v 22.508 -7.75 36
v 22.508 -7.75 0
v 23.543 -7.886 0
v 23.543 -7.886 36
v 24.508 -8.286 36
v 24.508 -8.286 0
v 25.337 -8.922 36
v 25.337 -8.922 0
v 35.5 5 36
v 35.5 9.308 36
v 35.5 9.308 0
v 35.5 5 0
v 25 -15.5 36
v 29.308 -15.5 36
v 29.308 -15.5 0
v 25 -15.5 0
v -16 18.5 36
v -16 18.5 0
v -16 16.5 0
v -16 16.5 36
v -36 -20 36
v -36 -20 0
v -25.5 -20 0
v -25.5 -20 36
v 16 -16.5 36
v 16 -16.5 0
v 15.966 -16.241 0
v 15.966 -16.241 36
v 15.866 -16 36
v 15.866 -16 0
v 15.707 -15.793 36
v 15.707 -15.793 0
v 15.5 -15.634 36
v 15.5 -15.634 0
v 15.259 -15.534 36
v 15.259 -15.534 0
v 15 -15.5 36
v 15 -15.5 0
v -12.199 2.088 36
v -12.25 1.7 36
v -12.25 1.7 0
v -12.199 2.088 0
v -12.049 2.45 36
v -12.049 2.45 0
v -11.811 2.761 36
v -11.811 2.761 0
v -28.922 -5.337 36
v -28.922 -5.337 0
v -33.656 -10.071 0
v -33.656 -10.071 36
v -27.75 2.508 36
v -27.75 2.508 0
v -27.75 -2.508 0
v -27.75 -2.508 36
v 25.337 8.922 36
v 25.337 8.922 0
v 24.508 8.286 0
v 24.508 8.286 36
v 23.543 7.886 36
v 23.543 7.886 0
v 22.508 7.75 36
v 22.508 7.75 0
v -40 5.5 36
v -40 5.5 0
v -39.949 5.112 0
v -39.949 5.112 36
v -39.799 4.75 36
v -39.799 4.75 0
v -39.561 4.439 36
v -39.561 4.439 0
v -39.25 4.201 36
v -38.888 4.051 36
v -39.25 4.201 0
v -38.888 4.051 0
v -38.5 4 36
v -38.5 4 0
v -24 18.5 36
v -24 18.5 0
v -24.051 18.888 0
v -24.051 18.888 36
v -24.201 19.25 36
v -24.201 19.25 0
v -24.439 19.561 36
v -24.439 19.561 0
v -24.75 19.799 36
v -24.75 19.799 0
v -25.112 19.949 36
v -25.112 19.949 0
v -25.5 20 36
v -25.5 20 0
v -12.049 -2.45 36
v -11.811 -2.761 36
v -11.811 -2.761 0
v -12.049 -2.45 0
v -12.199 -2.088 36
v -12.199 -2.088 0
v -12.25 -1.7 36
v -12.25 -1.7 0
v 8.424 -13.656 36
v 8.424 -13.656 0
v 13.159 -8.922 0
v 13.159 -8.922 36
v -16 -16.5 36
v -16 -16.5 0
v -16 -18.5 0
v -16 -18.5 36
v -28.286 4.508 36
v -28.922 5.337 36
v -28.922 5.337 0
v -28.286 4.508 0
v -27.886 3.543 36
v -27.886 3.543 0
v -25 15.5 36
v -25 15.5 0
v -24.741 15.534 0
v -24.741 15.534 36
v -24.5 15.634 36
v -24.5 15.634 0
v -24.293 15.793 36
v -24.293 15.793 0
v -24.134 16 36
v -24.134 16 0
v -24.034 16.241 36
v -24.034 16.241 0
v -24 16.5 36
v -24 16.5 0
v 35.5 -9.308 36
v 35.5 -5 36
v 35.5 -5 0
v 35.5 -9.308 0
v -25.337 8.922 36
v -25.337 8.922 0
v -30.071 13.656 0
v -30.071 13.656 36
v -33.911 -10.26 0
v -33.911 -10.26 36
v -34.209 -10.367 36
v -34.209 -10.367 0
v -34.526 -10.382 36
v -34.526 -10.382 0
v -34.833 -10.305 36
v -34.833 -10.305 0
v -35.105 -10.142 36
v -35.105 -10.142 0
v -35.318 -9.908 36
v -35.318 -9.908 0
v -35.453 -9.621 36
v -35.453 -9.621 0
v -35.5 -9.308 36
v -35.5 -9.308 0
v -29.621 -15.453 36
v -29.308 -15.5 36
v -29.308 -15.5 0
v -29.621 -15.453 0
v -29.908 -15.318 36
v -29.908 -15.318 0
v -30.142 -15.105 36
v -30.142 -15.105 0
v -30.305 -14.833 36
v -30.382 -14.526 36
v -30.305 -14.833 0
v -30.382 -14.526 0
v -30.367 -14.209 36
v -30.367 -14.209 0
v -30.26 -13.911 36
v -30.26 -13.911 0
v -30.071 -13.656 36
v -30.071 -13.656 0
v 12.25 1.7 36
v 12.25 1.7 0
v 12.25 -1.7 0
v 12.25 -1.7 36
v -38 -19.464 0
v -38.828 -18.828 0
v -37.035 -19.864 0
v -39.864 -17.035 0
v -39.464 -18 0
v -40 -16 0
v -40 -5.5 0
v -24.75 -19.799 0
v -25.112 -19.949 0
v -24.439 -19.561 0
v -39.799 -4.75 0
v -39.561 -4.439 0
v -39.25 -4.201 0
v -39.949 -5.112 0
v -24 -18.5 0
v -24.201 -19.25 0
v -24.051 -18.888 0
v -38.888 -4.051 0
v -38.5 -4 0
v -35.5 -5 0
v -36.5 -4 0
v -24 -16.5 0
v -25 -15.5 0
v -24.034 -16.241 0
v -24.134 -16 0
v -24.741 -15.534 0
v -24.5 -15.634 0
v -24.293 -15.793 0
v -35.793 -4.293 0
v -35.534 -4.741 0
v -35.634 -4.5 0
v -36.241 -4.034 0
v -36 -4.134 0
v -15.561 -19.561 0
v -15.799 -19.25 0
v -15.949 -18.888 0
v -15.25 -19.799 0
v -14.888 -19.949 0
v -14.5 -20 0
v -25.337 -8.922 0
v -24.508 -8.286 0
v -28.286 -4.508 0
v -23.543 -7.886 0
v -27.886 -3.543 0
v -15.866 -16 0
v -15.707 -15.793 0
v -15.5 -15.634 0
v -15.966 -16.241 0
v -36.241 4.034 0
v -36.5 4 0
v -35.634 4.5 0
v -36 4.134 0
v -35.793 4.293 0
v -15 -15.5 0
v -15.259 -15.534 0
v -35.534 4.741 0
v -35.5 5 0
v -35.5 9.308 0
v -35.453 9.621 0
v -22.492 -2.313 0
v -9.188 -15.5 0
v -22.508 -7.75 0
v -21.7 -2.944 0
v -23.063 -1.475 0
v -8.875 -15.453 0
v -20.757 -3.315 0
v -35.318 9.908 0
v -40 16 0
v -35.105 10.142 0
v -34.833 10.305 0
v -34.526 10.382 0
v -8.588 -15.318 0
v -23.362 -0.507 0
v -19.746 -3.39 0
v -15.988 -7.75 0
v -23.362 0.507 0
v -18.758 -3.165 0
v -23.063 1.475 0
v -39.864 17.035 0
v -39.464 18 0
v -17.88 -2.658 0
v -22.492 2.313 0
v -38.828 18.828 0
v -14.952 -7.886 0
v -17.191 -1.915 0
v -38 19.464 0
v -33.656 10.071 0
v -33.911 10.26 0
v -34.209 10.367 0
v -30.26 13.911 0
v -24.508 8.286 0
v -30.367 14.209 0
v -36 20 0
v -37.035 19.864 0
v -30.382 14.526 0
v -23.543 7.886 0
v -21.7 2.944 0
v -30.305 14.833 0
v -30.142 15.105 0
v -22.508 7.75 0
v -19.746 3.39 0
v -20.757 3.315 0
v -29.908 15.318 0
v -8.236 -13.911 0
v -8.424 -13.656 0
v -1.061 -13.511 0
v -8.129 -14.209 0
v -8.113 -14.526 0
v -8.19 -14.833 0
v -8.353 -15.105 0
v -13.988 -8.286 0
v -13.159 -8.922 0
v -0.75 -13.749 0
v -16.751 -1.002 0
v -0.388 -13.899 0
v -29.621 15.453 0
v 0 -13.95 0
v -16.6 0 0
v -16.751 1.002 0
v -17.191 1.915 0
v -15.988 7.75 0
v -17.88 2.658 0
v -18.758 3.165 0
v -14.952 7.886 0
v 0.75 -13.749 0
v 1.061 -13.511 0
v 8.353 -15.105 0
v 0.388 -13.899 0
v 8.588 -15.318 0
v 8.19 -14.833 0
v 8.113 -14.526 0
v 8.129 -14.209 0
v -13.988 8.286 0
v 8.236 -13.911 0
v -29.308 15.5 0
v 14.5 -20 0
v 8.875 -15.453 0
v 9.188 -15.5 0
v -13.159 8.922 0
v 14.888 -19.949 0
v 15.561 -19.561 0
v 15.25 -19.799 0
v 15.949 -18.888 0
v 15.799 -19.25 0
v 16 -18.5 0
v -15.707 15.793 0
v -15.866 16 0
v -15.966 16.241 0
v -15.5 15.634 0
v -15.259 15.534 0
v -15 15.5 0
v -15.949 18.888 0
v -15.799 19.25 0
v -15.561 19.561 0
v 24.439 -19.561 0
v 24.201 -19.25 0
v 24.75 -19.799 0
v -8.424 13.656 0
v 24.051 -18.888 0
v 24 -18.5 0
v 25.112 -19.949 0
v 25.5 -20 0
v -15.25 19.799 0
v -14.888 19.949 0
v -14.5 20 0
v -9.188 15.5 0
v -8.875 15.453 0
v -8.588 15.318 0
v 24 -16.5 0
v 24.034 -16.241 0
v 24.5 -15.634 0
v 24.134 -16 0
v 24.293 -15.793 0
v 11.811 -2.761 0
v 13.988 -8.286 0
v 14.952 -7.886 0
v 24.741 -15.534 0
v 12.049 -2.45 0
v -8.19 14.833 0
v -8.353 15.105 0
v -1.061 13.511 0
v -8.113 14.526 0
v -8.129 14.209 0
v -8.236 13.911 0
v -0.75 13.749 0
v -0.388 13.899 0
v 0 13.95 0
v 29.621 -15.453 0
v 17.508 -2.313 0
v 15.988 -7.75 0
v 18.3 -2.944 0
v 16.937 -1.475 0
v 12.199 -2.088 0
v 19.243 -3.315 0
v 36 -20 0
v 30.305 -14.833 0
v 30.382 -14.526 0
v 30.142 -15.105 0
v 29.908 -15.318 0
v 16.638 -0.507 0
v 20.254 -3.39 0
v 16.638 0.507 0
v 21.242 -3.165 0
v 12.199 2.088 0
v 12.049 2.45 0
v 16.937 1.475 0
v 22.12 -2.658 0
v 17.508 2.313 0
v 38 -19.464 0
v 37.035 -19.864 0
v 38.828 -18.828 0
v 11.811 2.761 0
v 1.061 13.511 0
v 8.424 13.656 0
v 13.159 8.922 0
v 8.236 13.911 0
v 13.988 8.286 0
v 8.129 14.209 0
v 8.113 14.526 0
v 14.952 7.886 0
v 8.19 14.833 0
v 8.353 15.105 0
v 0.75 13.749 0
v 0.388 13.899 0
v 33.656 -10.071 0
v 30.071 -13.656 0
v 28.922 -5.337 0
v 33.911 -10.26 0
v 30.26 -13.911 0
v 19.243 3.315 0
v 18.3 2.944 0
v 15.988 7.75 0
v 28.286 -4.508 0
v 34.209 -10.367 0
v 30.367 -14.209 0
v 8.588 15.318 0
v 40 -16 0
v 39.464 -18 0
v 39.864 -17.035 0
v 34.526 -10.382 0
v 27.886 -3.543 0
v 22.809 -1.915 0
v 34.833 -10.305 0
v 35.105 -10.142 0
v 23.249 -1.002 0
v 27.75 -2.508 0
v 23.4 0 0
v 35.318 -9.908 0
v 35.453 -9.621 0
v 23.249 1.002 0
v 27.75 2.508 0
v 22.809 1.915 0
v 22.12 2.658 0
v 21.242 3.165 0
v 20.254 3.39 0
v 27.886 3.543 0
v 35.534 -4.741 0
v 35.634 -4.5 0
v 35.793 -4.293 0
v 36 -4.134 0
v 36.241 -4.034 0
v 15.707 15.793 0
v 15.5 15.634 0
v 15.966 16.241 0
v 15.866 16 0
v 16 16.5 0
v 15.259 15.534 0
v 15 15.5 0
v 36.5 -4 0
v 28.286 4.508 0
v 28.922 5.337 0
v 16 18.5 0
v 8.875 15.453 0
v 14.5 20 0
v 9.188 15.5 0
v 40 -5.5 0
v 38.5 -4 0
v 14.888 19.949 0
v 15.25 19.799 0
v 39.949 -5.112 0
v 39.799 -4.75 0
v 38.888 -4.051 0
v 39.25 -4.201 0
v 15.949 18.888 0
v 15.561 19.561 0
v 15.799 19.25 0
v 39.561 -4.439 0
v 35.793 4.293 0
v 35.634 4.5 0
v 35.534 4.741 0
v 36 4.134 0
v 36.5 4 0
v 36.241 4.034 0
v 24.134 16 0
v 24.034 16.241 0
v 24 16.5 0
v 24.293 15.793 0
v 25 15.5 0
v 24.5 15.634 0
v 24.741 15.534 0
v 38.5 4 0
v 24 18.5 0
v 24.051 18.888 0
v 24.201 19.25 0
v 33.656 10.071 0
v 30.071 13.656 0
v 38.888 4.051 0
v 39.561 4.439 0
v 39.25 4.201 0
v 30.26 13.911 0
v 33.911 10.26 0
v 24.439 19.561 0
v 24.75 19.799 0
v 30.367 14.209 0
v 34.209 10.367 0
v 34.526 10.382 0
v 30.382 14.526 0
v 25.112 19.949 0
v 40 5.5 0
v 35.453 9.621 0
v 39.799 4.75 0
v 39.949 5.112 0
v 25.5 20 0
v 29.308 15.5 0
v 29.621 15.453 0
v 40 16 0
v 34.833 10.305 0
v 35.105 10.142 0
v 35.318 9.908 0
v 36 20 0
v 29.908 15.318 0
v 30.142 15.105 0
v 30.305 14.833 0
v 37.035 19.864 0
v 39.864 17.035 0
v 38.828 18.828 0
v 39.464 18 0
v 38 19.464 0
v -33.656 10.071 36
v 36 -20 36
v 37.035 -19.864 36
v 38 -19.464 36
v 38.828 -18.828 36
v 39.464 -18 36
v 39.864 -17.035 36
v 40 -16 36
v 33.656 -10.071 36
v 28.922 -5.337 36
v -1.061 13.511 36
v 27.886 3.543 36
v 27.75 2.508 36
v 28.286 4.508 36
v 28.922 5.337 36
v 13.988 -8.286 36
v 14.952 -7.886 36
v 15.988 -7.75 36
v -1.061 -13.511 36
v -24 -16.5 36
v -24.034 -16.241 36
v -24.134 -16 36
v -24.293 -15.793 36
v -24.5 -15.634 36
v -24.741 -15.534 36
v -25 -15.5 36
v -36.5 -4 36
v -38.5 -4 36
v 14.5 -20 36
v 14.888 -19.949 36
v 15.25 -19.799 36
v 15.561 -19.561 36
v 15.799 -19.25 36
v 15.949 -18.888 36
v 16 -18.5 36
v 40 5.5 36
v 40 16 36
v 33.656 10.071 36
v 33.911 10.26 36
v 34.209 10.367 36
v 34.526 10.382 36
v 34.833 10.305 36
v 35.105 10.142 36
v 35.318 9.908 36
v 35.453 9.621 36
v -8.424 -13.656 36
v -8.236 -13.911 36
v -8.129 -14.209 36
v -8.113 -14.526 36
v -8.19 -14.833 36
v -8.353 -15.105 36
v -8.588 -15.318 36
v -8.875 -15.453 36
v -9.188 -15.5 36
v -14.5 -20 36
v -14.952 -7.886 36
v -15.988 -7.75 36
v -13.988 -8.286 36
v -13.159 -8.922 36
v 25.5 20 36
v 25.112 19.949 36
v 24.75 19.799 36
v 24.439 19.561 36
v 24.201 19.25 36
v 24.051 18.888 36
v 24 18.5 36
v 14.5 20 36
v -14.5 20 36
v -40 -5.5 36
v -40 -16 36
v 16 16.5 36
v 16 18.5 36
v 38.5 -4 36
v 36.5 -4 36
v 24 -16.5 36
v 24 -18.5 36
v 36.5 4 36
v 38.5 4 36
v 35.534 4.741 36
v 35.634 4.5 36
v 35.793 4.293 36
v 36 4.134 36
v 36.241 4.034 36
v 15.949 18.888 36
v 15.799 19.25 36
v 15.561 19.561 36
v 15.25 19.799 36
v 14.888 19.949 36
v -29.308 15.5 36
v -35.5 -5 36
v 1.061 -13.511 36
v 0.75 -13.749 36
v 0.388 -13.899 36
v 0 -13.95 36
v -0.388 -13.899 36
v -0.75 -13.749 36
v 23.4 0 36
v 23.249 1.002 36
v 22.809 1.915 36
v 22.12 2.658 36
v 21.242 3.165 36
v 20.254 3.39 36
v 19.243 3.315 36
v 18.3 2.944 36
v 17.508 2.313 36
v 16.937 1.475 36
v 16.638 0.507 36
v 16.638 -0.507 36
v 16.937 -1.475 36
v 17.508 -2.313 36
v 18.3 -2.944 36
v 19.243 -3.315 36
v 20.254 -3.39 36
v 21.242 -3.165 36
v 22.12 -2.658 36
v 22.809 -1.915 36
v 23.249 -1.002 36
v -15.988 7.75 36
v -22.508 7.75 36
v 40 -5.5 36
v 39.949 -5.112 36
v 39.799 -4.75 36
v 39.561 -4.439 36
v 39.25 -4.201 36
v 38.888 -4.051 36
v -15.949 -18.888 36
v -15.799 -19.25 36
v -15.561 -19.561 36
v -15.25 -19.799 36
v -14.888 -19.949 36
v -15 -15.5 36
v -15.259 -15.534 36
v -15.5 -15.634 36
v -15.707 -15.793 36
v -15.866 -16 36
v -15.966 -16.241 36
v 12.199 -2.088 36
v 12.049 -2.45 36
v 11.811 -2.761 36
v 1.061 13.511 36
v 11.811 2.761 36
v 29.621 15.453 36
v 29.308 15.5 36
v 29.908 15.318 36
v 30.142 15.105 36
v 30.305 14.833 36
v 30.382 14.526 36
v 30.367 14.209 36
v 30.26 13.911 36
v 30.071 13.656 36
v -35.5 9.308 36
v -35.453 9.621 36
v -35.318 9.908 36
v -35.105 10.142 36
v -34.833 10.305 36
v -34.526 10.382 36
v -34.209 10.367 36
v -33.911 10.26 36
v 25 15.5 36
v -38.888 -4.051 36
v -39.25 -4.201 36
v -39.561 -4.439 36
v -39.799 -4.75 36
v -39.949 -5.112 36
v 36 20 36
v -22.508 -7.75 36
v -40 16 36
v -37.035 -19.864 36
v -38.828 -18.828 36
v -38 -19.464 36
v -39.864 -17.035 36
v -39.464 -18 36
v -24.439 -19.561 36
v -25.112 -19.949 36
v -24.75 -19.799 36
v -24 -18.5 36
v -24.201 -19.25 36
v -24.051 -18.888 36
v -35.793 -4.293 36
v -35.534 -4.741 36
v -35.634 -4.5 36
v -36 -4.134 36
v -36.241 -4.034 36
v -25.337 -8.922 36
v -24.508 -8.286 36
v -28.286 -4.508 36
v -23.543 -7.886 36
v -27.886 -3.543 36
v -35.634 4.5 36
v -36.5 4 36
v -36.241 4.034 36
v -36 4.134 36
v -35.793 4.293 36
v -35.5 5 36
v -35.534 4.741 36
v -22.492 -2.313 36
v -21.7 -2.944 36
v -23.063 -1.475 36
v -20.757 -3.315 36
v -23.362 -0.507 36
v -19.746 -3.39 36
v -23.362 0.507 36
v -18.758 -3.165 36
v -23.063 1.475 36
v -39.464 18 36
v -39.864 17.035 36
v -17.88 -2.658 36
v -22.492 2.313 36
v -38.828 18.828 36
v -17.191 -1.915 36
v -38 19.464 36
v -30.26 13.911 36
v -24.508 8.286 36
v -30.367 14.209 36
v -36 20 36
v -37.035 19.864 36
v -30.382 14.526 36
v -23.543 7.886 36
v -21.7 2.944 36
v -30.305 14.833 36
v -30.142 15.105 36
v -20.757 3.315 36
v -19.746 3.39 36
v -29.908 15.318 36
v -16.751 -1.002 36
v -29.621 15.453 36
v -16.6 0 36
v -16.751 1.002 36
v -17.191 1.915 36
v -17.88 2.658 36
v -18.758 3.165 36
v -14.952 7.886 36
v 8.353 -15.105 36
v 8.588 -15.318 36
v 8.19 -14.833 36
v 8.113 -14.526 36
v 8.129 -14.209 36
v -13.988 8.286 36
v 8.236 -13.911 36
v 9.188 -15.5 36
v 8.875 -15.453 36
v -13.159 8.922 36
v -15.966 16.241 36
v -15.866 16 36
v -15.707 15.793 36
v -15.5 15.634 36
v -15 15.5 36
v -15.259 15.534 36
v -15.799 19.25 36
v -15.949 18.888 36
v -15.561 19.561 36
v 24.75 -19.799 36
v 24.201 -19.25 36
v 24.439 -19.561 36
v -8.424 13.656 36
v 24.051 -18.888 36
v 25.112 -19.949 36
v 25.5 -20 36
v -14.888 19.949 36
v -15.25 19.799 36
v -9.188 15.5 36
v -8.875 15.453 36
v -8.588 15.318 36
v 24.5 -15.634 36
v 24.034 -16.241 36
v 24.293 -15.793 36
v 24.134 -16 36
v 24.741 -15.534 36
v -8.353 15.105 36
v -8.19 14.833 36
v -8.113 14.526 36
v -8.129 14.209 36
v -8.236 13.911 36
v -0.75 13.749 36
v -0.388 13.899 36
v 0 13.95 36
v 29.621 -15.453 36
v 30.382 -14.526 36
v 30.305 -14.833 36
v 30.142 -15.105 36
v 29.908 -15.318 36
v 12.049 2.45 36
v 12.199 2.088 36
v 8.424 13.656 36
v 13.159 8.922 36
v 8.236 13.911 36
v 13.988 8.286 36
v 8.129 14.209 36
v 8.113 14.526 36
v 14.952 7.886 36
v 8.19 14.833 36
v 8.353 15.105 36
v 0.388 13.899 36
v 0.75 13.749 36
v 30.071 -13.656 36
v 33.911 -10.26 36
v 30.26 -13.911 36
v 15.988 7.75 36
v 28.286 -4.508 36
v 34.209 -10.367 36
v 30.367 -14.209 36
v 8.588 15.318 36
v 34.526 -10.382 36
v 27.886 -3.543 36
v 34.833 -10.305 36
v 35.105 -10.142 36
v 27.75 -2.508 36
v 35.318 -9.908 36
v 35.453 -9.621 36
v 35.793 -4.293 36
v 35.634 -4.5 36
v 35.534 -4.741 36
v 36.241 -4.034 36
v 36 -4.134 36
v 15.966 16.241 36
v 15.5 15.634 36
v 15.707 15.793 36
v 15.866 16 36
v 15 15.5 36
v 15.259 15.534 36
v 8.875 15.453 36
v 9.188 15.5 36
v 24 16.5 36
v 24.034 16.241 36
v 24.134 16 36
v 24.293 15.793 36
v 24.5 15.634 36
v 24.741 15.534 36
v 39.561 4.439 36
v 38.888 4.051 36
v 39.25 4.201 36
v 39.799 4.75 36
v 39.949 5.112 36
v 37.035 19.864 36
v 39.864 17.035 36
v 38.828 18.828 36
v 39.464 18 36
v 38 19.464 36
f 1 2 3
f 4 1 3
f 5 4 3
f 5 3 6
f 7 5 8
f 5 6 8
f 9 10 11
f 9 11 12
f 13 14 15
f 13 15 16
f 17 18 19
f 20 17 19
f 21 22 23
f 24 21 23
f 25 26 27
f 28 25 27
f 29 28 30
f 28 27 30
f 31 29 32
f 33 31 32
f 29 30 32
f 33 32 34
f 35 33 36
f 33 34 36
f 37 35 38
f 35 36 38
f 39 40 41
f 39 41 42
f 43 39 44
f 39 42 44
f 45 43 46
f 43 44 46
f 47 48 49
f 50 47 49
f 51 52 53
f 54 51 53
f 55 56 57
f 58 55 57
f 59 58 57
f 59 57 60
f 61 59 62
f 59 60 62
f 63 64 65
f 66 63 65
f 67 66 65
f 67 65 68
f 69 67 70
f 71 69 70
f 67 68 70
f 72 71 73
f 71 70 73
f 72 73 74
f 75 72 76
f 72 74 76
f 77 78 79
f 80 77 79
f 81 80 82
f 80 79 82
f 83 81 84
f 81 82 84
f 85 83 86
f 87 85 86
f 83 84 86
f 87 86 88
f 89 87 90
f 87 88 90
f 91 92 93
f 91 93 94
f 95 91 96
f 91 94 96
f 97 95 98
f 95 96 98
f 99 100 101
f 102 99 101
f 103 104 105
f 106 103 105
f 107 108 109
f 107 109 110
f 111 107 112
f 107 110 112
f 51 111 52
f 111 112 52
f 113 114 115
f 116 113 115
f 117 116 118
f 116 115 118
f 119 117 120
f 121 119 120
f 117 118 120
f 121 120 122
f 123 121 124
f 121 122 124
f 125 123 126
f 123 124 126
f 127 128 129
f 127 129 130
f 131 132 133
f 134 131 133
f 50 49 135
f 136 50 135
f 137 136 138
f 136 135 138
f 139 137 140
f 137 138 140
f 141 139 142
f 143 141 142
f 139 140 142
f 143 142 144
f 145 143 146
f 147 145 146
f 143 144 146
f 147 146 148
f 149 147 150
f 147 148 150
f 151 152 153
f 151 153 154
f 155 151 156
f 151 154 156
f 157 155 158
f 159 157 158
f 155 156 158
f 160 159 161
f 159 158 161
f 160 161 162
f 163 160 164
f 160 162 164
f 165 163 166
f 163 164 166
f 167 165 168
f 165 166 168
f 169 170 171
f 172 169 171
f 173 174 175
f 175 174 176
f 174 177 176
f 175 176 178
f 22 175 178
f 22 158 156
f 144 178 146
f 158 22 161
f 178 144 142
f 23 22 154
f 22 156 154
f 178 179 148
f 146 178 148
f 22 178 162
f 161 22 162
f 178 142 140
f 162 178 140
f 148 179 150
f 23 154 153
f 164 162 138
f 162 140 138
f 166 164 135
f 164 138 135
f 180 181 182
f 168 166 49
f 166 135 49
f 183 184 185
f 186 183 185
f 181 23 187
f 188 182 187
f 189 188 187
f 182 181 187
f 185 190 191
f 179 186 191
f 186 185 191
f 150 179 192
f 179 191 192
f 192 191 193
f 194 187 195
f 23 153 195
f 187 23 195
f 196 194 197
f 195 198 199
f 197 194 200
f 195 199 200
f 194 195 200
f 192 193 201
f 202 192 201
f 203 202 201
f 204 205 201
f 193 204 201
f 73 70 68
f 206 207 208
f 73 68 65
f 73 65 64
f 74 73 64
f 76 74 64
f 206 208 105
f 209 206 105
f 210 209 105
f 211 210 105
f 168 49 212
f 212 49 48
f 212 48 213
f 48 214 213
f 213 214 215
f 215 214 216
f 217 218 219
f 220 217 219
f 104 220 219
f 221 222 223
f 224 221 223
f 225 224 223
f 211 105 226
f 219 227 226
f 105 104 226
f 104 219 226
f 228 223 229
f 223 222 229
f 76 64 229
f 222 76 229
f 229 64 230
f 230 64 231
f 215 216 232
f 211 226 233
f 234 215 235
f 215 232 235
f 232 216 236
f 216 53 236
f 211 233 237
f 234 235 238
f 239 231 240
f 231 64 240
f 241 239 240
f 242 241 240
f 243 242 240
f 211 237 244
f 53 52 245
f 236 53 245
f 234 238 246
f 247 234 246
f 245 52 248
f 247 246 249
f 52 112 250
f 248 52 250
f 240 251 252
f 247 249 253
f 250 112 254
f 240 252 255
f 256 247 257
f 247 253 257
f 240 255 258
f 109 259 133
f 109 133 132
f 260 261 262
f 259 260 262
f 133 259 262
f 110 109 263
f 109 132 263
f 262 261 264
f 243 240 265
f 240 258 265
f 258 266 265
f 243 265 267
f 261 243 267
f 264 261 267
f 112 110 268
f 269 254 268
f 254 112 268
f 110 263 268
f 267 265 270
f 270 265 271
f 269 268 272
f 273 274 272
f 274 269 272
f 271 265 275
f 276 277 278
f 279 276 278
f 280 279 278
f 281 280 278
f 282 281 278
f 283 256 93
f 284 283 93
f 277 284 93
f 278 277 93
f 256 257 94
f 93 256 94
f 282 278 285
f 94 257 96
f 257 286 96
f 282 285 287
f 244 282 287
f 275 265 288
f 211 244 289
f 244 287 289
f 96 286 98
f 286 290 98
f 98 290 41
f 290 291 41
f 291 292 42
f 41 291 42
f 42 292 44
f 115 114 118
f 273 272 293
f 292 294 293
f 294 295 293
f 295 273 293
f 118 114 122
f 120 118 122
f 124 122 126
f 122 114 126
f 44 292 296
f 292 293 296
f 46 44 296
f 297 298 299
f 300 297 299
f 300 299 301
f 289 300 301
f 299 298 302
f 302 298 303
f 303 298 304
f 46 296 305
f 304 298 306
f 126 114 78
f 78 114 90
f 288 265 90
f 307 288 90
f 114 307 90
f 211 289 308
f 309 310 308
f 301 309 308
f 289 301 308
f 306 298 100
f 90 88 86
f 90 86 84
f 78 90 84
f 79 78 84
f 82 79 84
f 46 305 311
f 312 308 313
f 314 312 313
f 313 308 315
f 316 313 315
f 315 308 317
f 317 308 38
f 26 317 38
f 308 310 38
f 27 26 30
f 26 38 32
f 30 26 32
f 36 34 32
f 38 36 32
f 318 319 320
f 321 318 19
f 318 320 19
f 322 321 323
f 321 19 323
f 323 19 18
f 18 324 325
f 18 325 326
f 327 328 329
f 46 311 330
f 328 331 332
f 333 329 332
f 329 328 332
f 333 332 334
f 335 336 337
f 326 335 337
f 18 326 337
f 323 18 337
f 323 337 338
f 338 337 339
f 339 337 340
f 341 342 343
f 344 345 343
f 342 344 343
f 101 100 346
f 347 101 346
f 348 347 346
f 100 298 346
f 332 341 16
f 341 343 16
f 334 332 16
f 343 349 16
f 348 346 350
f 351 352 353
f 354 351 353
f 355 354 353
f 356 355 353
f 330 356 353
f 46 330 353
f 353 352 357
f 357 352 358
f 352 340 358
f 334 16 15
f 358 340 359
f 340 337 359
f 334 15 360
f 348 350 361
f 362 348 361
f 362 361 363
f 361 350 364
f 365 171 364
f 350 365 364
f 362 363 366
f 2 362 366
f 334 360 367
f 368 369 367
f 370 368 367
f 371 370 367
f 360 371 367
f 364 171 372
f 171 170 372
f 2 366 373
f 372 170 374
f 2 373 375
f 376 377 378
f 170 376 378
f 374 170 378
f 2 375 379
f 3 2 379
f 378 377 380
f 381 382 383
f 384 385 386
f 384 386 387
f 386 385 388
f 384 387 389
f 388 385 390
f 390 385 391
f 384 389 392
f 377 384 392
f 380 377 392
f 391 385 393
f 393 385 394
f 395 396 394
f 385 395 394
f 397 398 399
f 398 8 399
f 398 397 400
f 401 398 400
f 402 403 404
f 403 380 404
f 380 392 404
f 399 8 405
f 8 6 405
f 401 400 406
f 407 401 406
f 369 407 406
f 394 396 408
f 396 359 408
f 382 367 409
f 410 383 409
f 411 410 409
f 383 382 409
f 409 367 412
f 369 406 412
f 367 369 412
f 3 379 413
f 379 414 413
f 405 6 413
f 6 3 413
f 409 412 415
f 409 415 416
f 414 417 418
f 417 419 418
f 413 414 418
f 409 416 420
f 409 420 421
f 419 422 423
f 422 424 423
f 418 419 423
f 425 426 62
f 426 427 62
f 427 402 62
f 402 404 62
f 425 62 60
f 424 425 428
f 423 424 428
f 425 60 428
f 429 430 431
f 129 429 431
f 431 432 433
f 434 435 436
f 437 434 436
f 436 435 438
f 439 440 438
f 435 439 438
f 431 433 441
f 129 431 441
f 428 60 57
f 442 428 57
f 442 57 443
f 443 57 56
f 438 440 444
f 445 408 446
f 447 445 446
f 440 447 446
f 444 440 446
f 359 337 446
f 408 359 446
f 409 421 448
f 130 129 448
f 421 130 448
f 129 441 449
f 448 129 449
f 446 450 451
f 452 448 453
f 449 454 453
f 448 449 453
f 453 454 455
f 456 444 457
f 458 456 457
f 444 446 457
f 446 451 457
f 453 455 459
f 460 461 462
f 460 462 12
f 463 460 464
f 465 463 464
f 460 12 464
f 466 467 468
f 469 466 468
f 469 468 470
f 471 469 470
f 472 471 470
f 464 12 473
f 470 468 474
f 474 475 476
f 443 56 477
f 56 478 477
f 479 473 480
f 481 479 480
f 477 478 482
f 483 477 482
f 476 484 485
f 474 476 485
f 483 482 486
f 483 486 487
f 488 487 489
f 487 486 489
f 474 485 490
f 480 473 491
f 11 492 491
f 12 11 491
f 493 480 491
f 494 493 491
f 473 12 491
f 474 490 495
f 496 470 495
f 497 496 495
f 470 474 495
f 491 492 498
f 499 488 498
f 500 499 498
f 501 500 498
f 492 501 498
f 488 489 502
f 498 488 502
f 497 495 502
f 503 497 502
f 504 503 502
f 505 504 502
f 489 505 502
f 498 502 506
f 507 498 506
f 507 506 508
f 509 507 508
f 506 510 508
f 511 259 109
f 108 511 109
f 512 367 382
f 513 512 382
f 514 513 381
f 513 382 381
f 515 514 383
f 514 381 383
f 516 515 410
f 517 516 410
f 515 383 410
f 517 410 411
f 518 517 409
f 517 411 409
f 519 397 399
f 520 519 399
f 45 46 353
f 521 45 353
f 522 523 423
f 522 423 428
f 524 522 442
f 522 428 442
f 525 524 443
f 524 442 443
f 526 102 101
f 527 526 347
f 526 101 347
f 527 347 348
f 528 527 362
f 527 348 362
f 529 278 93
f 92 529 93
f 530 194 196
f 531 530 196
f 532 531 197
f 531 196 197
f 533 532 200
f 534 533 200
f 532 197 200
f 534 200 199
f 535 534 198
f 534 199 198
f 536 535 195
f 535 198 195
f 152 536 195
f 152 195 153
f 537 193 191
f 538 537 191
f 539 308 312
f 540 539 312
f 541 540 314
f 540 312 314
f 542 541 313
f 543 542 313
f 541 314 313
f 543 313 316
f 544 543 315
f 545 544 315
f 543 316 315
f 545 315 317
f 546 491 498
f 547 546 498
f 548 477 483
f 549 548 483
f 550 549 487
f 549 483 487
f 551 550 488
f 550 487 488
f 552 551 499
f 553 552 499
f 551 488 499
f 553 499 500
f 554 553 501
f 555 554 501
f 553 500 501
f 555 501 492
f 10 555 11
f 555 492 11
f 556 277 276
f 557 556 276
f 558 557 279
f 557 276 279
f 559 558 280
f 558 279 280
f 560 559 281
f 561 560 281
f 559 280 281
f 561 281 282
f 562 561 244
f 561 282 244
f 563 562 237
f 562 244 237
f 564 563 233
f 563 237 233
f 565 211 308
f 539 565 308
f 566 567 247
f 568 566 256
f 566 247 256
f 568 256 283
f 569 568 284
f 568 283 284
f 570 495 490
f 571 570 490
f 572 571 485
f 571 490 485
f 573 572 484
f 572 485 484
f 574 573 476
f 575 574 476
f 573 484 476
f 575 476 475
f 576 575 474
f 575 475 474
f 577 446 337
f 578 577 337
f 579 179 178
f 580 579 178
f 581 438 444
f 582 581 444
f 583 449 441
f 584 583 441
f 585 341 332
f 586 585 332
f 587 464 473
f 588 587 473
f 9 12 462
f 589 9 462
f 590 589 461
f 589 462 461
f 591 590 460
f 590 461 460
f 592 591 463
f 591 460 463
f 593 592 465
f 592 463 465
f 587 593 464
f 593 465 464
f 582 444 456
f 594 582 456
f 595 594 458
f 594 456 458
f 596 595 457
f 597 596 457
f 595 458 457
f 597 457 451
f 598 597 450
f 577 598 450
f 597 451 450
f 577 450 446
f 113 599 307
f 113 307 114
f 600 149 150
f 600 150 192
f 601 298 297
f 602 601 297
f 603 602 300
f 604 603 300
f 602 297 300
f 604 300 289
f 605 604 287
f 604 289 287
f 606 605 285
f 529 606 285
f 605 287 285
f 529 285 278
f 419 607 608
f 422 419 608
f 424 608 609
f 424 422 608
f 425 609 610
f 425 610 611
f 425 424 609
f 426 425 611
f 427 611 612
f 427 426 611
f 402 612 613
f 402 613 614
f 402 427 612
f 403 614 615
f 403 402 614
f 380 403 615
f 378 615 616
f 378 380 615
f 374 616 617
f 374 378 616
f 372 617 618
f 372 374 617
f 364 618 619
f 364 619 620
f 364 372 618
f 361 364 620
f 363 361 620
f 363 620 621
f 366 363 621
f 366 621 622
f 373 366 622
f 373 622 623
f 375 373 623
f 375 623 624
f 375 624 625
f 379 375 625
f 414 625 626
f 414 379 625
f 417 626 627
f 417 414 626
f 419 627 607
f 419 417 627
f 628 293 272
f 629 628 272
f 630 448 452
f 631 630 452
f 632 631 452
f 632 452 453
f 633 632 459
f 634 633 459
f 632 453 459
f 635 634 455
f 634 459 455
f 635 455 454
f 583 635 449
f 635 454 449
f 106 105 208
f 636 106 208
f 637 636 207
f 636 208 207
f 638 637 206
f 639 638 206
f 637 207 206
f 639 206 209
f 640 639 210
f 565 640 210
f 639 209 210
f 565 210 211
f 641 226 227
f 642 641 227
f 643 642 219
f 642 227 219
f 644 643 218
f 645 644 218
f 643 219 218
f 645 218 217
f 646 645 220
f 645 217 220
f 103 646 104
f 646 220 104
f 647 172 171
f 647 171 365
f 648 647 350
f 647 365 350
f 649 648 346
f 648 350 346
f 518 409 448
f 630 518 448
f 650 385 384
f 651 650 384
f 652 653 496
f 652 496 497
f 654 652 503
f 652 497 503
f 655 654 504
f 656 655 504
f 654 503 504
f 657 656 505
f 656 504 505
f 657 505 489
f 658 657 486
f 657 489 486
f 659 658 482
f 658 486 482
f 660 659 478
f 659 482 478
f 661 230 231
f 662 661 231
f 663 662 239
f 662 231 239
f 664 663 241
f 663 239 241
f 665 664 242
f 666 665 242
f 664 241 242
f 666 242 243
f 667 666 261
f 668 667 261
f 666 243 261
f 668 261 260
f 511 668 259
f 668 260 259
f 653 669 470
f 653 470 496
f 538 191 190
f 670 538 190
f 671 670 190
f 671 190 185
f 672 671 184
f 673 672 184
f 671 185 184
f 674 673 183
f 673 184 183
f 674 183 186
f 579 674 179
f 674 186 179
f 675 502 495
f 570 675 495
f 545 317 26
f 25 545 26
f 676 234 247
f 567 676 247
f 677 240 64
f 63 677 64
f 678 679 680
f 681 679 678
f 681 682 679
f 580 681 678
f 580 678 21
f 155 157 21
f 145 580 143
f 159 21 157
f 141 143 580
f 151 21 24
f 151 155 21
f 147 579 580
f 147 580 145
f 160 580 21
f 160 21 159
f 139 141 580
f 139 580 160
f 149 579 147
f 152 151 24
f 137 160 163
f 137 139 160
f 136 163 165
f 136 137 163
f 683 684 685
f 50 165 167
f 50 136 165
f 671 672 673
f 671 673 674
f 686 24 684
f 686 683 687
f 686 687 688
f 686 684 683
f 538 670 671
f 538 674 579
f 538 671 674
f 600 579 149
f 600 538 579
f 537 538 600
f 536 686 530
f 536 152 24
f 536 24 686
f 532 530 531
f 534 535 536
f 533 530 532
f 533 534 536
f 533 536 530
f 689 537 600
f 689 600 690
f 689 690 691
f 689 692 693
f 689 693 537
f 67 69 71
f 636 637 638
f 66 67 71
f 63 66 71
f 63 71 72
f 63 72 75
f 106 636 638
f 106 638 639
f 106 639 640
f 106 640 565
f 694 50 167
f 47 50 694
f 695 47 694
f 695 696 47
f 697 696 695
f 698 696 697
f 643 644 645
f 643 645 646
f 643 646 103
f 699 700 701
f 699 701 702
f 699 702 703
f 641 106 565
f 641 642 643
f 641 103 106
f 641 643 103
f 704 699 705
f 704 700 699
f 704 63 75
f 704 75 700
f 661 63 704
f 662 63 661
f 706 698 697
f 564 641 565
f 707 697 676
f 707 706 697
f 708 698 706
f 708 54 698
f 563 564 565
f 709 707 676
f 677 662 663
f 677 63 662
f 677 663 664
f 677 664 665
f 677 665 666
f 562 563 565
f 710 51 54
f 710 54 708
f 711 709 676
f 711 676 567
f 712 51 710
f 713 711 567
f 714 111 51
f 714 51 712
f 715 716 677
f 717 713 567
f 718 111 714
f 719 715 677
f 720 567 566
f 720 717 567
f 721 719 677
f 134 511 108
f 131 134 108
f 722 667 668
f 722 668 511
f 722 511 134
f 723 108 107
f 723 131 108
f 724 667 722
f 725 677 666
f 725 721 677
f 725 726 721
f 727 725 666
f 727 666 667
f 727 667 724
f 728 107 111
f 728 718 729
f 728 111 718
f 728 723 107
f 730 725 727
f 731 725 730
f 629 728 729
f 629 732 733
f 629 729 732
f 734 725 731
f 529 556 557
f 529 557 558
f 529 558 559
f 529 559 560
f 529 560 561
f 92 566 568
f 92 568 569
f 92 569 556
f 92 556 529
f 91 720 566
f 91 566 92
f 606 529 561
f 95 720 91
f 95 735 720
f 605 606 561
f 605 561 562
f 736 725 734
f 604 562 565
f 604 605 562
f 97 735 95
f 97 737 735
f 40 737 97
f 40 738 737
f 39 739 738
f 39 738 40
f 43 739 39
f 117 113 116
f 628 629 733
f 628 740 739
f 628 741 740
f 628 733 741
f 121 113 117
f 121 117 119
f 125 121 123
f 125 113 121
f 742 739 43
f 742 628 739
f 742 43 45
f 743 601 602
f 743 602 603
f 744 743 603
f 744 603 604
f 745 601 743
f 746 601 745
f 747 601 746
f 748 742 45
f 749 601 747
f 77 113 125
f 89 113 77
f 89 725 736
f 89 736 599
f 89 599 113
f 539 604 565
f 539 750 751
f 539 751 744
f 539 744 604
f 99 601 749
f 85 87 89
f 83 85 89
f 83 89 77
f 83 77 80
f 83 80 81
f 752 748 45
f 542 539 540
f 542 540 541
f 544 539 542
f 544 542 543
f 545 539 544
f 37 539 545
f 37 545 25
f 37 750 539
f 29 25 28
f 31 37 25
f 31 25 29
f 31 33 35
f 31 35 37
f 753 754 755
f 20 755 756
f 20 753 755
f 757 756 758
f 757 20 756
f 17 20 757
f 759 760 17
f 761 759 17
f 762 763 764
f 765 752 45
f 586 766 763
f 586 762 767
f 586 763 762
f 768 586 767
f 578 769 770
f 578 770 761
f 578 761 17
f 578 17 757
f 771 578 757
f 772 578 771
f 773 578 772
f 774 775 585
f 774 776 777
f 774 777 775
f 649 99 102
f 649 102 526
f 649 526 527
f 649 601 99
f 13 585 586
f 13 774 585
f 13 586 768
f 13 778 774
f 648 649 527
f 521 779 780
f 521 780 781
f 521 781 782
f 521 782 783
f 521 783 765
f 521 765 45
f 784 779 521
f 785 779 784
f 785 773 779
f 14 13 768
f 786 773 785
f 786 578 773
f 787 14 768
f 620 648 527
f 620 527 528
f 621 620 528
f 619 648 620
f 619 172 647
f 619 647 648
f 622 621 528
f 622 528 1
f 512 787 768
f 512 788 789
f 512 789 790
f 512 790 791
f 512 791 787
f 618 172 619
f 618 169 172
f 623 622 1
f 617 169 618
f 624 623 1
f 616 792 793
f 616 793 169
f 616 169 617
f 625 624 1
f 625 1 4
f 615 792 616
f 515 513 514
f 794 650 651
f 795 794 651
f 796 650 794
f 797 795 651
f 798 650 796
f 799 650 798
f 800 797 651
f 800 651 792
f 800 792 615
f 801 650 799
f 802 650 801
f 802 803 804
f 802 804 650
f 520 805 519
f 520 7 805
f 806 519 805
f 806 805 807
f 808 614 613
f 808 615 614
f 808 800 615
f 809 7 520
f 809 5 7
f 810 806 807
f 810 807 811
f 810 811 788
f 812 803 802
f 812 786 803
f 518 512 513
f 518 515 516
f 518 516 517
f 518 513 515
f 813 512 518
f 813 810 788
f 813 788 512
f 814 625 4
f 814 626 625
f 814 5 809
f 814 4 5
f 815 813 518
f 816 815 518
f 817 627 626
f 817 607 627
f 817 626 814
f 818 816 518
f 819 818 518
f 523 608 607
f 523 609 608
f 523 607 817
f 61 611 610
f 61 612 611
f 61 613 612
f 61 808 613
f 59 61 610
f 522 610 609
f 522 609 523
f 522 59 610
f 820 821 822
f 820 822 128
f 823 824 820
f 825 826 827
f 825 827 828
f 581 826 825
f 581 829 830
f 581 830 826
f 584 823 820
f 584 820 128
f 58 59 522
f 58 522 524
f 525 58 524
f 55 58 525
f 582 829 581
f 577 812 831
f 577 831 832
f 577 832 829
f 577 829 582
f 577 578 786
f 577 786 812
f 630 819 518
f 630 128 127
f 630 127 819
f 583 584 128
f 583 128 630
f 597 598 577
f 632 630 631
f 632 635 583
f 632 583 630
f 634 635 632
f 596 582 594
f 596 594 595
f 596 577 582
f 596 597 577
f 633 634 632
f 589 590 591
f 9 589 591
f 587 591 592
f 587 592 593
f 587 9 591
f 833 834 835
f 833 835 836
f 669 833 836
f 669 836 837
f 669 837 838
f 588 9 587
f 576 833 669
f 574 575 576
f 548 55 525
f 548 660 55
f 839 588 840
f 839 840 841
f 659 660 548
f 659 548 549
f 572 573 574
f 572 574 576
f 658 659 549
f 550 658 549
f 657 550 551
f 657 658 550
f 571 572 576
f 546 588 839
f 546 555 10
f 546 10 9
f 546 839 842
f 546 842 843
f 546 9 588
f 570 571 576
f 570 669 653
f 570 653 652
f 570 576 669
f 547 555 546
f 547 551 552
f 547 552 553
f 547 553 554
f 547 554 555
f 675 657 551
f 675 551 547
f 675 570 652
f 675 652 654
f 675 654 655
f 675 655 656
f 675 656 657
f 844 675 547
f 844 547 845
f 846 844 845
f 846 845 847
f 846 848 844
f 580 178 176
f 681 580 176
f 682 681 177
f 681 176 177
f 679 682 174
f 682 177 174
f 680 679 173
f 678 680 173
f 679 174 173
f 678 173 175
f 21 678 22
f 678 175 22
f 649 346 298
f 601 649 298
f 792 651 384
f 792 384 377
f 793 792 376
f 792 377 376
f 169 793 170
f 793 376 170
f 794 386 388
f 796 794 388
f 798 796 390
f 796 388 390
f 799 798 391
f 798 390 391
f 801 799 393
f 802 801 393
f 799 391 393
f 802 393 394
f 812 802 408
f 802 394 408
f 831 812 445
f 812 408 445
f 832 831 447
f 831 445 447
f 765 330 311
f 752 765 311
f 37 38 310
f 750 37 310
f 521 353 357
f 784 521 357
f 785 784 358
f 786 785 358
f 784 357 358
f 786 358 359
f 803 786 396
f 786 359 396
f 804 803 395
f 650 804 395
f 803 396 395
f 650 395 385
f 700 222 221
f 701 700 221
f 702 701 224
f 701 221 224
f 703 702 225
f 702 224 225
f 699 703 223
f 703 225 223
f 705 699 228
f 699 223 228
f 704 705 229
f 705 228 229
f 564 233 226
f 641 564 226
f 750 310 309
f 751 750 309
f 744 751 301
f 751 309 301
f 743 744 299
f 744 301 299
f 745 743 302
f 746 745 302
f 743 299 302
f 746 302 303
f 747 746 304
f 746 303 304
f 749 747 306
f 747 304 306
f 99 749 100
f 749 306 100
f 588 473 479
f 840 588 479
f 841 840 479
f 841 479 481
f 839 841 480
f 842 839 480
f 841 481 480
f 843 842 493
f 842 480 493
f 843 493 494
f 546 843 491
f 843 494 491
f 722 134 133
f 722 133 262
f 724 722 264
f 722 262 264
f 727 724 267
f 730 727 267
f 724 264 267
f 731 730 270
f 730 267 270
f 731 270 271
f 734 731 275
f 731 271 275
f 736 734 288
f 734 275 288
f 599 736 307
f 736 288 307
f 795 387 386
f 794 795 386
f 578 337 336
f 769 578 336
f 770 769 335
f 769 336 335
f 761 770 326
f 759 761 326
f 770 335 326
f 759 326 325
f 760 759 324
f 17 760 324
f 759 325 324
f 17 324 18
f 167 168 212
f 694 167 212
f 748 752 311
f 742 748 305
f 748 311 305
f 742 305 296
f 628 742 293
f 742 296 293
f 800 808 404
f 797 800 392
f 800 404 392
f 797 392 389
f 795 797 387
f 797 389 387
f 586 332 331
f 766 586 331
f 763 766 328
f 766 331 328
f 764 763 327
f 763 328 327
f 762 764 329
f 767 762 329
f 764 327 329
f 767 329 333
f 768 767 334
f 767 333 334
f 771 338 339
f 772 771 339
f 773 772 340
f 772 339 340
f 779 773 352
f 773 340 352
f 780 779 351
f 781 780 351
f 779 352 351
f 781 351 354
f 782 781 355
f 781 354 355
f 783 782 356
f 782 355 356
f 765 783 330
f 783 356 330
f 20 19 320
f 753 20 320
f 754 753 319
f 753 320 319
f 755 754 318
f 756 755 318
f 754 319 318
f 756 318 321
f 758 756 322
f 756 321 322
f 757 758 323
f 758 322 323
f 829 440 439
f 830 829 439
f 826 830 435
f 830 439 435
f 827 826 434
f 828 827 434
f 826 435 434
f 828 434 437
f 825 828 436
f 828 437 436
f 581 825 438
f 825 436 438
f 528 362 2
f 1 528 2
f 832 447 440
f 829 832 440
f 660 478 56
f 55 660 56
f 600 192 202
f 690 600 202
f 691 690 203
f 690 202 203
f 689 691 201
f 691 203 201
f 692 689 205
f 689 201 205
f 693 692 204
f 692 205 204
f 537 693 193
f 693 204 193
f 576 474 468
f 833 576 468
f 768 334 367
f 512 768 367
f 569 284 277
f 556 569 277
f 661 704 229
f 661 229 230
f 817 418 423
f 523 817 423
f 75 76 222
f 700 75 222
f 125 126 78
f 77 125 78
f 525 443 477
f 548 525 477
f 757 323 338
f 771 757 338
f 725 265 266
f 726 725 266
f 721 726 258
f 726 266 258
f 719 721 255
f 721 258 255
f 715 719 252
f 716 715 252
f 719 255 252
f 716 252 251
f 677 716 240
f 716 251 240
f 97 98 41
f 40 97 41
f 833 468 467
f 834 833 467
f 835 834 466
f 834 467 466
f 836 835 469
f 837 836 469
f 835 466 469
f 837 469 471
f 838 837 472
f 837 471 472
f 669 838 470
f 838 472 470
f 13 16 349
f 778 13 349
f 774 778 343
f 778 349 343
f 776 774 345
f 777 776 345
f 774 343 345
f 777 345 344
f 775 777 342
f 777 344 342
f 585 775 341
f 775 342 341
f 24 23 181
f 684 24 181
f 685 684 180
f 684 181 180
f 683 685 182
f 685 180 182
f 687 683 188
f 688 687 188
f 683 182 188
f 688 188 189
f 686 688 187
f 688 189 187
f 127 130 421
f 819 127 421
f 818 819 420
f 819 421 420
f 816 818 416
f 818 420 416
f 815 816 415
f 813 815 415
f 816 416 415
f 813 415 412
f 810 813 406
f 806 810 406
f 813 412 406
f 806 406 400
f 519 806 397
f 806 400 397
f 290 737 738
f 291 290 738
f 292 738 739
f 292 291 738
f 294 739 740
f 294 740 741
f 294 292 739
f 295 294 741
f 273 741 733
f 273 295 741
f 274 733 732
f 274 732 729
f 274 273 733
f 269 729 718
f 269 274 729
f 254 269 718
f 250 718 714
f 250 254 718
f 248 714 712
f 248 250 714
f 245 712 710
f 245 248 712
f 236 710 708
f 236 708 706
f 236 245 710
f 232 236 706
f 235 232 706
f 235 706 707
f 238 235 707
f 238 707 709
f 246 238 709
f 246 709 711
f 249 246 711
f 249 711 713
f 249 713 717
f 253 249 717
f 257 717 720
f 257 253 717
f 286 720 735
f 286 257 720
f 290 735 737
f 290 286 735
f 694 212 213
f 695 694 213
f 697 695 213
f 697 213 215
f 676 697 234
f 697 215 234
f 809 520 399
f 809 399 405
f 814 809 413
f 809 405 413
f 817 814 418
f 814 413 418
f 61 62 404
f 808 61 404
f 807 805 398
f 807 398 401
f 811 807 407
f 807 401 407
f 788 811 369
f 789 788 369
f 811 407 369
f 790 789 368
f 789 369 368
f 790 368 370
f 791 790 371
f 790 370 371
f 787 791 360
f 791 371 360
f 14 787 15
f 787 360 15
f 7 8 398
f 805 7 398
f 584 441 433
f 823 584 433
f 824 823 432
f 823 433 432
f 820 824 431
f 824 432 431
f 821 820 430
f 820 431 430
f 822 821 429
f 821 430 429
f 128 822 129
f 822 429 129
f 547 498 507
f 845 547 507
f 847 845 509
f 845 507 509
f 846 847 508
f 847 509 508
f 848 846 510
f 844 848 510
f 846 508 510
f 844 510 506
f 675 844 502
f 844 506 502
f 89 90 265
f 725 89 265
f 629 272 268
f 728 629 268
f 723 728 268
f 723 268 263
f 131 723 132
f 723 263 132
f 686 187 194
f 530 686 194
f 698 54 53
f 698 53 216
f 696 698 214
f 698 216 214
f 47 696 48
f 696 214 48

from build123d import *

# Parameters (mm, degrees)
SKETCH1_R           = 3.4
BOSS_EXTRUDE1_DEPTH = 36


with BuildPart() as part:
    # Sketch1 → Boss-Extrude1 (new body)
    with BuildSketch(Plane.XY):
        with BuildLine():
            Line((-36, -20), (-25.5, -20))
            ThreePointArc((-25.5, -20), (-24.439339828, -19.560660172), (-24, -18.5))
            Line((-24, -18.5), (-24, -16.5))
            ThreePointArc((-24, -16.5), (-24.292893219, -15.792893219), (-25, -15.5))
            Line((-25, -15.5), (-29.307617972, -15.5))
            ThreePointArc((-29.307617972, -15.5), (-30.305407867, -14.833298107), (-30.071293296, -13.656324676))
            Line((-30.071293296, -13.656324676), (-25.336541495, -8.921572875))
            ThreePointArc((-25.336541495, -8.921572875), (-24.038848099, -8.05448187), (-22.50811437, -7.75))
            Line((-22.50811437, -7.75), (-15.987648609, -7.75))
            ThreePointArc((-15.987648609, -7.75), (-14.45691488, -8.05448187), (-13.159221485, -8.921572875))
            Line((-13.159221485, -8.921572875), (-8.424469683, -13.656324676))
            ThreePointArc((-8.424469683, -13.656324676), (-8.190355112, -14.833298107), (-9.188145007, -15.5))
            Line((-9.188145007, -15.5), (-15, -15.5))
            ThreePointArc((-15, -15.5), (-15.707106781, -15.792893219), (-16, -16.5))
            Line((-16, -16.5), (-16, -18.5))
            ThreePointArc((-16, -18.5), (-15.560660172, -19.560660172), (-14.5, -20))
            Line((-14.5, -20), (14.5, -20))
            ThreePointArc((14.5, -20), (15.560660172, -19.560660172), (16, -18.5))
            Line((16, -18.5), (16, -16.5))
            ThreePointArc((16, -16.5), (15.707106781, -15.792893219), (15, -15.5))
            Line((15, -15.5), (9.188145007, -15.5))
            ThreePointArc((9.188145007, -15.5), (8.190355112, -14.833298107), (8.424469683, -13.656324676))
            Line((8.424469683, -13.656324676), (13.159221485, -8.921572875))
            ThreePointArc((13.159221485, -8.921572875), (14.45691488, -8.05448187), (15.987648609, -7.75))
            Line((15.987648609, -7.75), (22.50811437, -7.75))
            ThreePointArc((22.50811437, -7.75), (24.038848099, -8.05448187), (25.336541495, -8.921572875))
            Line((25.336541495, -8.921572875), (30.071293296, -13.656324676))
            ThreePointArc((30.071293296, -13.656324676), (30.305407867, -14.833298107), (29.307617972, -15.5))
            Line((29.307617972, -15.5), (25, -15.5))
            ThreePointArc((25, -15.5), (24.292893219, -15.792893219), (24, -16.5))
            Line((24, -16.5), (24, -18.5))
            ThreePointArc((24, -18.5), (24.439339828, -19.560660172), (25.5, -20))
            Line((25.5, -20), (36, -20))
            ThreePointArc((36, -20), (38.828427125, -18.828427125), (40, -16))
            Line((40, -16), (40, -5.5))
            ThreePointArc((40, -5.5), (39.560660172, -4.439339828), (38.5, -4))
            Line((38.5, -4), (36.5, -4))
            ThreePointArc((36.5, -4), (35.792893219, -4.292893219), (35.5, -5))
            Line((35.5, -5), (35.5, -9.307617972))
            ThreePointArc((35.5, -9.307617972), (34.833298107, -10.305407867), (33.656324676, -10.071293296))
            Line((33.656324676, -10.071293296), (28.921572875, -5.336541495))
            ThreePointArc((28.921572875, -5.336541495), (28.05448187, -4.038848099), (27.75, -2.50811437))
            Line((27.75, -2.50811437), (27.75, 2.50811437))
            ThreePointArc((27.75, 2.50811437), (28.05448187, 4.038848099), (28.921572875, 5.336541495))
            Line((28.921572875, 5.336541495), (33.656324676, 10.071293296))
            ThreePointArc((33.656324676, 10.071293296), (34.833298107, 10.305407867), (35.5, 9.307617972))
            Line((35.5, 9.307617972), (35.5, 5))
            ThreePointArc((35.5, 5), (35.792893219, 4.292893219), (36.5, 4))
            Line((36.5, 4), (38.5, 4))
            ThreePointArc((38.5, 4), (39.560660172, 4.439339828), (40, 5.5))
            Line((40, 5.5), (40, 16))
            ThreePointArc((40, 16), (38.828427125, 18.828427125), (36, 20))
            Line((36, 20), (25.5, 20))
            ThreePointArc((25.5, 20), (24.439339828, 19.560660172), (24, 18.5))
            Line((24, 18.5), (24, 16.5))
            ThreePointArc((24, 16.5), (24.292893219, 15.792893219), (25, 15.5))
            Line((25, 15.5), (29.307617972, 15.5))
            ThreePointArc((29.307617972, 15.5), (30.305407867, 14.833298107), (30.071293296, 13.656324676))
            Line((30.071293296, 13.656324676), (25.336541495, 8.921572875))
            ThreePointArc((25.336541495, 8.921572875), (24.038848099, 8.05448187), (22.50811437, 7.75))
            Line((22.50811437, 7.75), (15.987648609, 7.75))
            ThreePointArc((15.987648609, 7.75), (14.45691488, 8.05448187), (13.159221485, 8.921572875))
            Line((13.159221485, 8.921572875), (8.424469683, 13.656324676))
            ThreePointArc((8.424469683, 13.656324676), (8.190355112, 14.833298107), (9.188145007, 15.5))
            Line((9.188145007, 15.5), (15, 15.5))
            ThreePointArc((15, 15.5), (15.707106781, 15.792893219), (16, 16.5))
            Line((16, 16.5), (16, 18.5))
            ThreePointArc((16, 18.5), (15.560660172, 19.560660172), (14.5, 20))
            Line((14.5, 20), (-14.5, 20))
            ThreePointArc((-14.5, 20), (-15.560660172, 19.560660172), (-16, 18.5))
            Line((-16, 18.5), (-16, 16.5))
            ThreePointArc((-16, 16.5), (-15.707106781, 15.792893219), (-15, 15.5))
            Line((-15, 15.5), (-9.188145007, 15.5))
            ThreePointArc((-9.188145007, 15.5), (-8.190355112, 14.833298107), (-8.424469683, 13.656324676))
            Line((-8.424469683, 13.656324676), (-13.159221485, 8.921572875))
            ThreePointArc((-13.159221485, 8.921572875), (-14.45691488, 8.05448187), (-15.987648609, 7.75))
            Line((-15.987648609, 7.75), (-22.50811437, 7.75))
            ThreePointArc((-22.50811437, 7.75), (-24.038848099, 8.05448187), (-25.336541495, 8.921572875))
            Line((-25.336541495, 8.921572875), (-30.071293296, 13.656324676))
            ThreePointArc((-30.071293296, 13.656324676), (-30.305407867, 14.833298107), (-29.307617972, 15.5))
            Line((-29.307617972, 15.5), (-25, 15.5))
            ThreePointArc((-25, 15.5), (-24.292893219, 15.792893219), (-24, 16.5))
            Line((-24, 16.5), (-24, 18.5))
            ThreePointArc((-24, 18.5), (-24.439339828, 19.560660172), (-25.5, 20))
            Line((-25.5, 20), (-36, 20))
            ThreePointArc((-36, 20), (-38.828427125, 18.828427125), (-40, 16))
            Line((-40, 16), (-40, 5.5))
            ThreePointArc((-40, 5.5), (-39.560660172, 4.439339828), (-38.5, 4))
            Line((-38.5, 4), (-36.5, 4))
            ThreePointArc((-36.5, 4), (-35.792893219, 4.292893219), (-35.5, 5))
            Line((-35.5, 5), (-35.5, 9.307617972))
            ThreePointArc((-35.5, 9.307617972), (-34.833298107, 10.305407867), (-33.656324676, 10.071293296))
            Line((-33.656324676, 10.071293296), (-28.921572875, 5.336541495))
            ThreePointArc((-28.921572875, 5.336541495), (-28.05448187, 4.038848099), (-27.75, 2.50811437))
            Line((-27.75, 2.50811437), (-27.75, -2.50811437))
            ThreePointArc((-27.75, -2.50811437), (-28.05448187, -4.038848099), (-28.921572875, -5.336541495))
            Line((-28.921572875, -5.336541495), (-33.656324676, -10.071293296))
            ThreePointArc((-33.656324676, -10.071293296), (-34.833298107, -10.305407867), (-35.5, -9.307617972))
            Line((-35.5, -9.307617972), (-35.5, -5))
            ThreePointArc((-35.5, -5), (-35.792893219, -4.292893219), (-36.5, -4))
            Line((-36.5, -4), (-38.5, -4))
            ThreePointArc((-38.5, -4), (-39.560660172, -4.439339828), (-40, -5.5))
            Line((-40, -5.5), (-40, -16))
            ThreePointArc((-40, -16), (-38.828427125, -18.828427125), (-36, -20))
        make_face()
        with Locations((-20, 0)):
            Circle(SKETCH1_R, mode=Mode.SUBTRACT)
        with Locations((20, 0)):
            Circle(SKETCH1_R, mode=Mode.SUBTRACT)
        with BuildLine():
            Line((-11.810660172, 2.760660172), (-1.060660172, 13.510660172))
            ThreePointArc((-1.060660172, 13.510660172), (0, 13.95), (1.060660172, 13.510660172))
            Line((1.060660172, 13.510660172), (11.810660172, 2.760660172))
            ThreePointArc((11.810660172, 2.760660172), (12.135819299, 2.274025149), (12.25, 1.7))
            Line((12.25, 1.7), (12.25, -1.7))
            ThreePointArc((12.25, -1.7), (12.135819299, -2.274025149), (11.810660172, -2.760660172))
            Line((11.810660172, -2.760660172), (1.060660172, -13.510660172))
            ThreePointArc((1.060660172, -13.510660172), (0, -13.95), (-1.060660172, -13.510660172))
            Line((-1.060660172, -13.510660172), (-11.810660172, -2.760660172))
            ThreePointArc((-11.810660172, -2.760660172), (-12.135819299, -2.274025149), (-12.25, -1.7))
            Line((-12.25, -1.7), (-12.25, 1.7))
            ThreePointArc((-12.25, 1.7), (-12.135819299, 2.274025149), (-11.810660172, 2.760660172))
        make_face(mode=Mode.SUBTRACT)
    extrude(amount=BOSS_EXTRUDE1_DEPTH)


solid = part.part
